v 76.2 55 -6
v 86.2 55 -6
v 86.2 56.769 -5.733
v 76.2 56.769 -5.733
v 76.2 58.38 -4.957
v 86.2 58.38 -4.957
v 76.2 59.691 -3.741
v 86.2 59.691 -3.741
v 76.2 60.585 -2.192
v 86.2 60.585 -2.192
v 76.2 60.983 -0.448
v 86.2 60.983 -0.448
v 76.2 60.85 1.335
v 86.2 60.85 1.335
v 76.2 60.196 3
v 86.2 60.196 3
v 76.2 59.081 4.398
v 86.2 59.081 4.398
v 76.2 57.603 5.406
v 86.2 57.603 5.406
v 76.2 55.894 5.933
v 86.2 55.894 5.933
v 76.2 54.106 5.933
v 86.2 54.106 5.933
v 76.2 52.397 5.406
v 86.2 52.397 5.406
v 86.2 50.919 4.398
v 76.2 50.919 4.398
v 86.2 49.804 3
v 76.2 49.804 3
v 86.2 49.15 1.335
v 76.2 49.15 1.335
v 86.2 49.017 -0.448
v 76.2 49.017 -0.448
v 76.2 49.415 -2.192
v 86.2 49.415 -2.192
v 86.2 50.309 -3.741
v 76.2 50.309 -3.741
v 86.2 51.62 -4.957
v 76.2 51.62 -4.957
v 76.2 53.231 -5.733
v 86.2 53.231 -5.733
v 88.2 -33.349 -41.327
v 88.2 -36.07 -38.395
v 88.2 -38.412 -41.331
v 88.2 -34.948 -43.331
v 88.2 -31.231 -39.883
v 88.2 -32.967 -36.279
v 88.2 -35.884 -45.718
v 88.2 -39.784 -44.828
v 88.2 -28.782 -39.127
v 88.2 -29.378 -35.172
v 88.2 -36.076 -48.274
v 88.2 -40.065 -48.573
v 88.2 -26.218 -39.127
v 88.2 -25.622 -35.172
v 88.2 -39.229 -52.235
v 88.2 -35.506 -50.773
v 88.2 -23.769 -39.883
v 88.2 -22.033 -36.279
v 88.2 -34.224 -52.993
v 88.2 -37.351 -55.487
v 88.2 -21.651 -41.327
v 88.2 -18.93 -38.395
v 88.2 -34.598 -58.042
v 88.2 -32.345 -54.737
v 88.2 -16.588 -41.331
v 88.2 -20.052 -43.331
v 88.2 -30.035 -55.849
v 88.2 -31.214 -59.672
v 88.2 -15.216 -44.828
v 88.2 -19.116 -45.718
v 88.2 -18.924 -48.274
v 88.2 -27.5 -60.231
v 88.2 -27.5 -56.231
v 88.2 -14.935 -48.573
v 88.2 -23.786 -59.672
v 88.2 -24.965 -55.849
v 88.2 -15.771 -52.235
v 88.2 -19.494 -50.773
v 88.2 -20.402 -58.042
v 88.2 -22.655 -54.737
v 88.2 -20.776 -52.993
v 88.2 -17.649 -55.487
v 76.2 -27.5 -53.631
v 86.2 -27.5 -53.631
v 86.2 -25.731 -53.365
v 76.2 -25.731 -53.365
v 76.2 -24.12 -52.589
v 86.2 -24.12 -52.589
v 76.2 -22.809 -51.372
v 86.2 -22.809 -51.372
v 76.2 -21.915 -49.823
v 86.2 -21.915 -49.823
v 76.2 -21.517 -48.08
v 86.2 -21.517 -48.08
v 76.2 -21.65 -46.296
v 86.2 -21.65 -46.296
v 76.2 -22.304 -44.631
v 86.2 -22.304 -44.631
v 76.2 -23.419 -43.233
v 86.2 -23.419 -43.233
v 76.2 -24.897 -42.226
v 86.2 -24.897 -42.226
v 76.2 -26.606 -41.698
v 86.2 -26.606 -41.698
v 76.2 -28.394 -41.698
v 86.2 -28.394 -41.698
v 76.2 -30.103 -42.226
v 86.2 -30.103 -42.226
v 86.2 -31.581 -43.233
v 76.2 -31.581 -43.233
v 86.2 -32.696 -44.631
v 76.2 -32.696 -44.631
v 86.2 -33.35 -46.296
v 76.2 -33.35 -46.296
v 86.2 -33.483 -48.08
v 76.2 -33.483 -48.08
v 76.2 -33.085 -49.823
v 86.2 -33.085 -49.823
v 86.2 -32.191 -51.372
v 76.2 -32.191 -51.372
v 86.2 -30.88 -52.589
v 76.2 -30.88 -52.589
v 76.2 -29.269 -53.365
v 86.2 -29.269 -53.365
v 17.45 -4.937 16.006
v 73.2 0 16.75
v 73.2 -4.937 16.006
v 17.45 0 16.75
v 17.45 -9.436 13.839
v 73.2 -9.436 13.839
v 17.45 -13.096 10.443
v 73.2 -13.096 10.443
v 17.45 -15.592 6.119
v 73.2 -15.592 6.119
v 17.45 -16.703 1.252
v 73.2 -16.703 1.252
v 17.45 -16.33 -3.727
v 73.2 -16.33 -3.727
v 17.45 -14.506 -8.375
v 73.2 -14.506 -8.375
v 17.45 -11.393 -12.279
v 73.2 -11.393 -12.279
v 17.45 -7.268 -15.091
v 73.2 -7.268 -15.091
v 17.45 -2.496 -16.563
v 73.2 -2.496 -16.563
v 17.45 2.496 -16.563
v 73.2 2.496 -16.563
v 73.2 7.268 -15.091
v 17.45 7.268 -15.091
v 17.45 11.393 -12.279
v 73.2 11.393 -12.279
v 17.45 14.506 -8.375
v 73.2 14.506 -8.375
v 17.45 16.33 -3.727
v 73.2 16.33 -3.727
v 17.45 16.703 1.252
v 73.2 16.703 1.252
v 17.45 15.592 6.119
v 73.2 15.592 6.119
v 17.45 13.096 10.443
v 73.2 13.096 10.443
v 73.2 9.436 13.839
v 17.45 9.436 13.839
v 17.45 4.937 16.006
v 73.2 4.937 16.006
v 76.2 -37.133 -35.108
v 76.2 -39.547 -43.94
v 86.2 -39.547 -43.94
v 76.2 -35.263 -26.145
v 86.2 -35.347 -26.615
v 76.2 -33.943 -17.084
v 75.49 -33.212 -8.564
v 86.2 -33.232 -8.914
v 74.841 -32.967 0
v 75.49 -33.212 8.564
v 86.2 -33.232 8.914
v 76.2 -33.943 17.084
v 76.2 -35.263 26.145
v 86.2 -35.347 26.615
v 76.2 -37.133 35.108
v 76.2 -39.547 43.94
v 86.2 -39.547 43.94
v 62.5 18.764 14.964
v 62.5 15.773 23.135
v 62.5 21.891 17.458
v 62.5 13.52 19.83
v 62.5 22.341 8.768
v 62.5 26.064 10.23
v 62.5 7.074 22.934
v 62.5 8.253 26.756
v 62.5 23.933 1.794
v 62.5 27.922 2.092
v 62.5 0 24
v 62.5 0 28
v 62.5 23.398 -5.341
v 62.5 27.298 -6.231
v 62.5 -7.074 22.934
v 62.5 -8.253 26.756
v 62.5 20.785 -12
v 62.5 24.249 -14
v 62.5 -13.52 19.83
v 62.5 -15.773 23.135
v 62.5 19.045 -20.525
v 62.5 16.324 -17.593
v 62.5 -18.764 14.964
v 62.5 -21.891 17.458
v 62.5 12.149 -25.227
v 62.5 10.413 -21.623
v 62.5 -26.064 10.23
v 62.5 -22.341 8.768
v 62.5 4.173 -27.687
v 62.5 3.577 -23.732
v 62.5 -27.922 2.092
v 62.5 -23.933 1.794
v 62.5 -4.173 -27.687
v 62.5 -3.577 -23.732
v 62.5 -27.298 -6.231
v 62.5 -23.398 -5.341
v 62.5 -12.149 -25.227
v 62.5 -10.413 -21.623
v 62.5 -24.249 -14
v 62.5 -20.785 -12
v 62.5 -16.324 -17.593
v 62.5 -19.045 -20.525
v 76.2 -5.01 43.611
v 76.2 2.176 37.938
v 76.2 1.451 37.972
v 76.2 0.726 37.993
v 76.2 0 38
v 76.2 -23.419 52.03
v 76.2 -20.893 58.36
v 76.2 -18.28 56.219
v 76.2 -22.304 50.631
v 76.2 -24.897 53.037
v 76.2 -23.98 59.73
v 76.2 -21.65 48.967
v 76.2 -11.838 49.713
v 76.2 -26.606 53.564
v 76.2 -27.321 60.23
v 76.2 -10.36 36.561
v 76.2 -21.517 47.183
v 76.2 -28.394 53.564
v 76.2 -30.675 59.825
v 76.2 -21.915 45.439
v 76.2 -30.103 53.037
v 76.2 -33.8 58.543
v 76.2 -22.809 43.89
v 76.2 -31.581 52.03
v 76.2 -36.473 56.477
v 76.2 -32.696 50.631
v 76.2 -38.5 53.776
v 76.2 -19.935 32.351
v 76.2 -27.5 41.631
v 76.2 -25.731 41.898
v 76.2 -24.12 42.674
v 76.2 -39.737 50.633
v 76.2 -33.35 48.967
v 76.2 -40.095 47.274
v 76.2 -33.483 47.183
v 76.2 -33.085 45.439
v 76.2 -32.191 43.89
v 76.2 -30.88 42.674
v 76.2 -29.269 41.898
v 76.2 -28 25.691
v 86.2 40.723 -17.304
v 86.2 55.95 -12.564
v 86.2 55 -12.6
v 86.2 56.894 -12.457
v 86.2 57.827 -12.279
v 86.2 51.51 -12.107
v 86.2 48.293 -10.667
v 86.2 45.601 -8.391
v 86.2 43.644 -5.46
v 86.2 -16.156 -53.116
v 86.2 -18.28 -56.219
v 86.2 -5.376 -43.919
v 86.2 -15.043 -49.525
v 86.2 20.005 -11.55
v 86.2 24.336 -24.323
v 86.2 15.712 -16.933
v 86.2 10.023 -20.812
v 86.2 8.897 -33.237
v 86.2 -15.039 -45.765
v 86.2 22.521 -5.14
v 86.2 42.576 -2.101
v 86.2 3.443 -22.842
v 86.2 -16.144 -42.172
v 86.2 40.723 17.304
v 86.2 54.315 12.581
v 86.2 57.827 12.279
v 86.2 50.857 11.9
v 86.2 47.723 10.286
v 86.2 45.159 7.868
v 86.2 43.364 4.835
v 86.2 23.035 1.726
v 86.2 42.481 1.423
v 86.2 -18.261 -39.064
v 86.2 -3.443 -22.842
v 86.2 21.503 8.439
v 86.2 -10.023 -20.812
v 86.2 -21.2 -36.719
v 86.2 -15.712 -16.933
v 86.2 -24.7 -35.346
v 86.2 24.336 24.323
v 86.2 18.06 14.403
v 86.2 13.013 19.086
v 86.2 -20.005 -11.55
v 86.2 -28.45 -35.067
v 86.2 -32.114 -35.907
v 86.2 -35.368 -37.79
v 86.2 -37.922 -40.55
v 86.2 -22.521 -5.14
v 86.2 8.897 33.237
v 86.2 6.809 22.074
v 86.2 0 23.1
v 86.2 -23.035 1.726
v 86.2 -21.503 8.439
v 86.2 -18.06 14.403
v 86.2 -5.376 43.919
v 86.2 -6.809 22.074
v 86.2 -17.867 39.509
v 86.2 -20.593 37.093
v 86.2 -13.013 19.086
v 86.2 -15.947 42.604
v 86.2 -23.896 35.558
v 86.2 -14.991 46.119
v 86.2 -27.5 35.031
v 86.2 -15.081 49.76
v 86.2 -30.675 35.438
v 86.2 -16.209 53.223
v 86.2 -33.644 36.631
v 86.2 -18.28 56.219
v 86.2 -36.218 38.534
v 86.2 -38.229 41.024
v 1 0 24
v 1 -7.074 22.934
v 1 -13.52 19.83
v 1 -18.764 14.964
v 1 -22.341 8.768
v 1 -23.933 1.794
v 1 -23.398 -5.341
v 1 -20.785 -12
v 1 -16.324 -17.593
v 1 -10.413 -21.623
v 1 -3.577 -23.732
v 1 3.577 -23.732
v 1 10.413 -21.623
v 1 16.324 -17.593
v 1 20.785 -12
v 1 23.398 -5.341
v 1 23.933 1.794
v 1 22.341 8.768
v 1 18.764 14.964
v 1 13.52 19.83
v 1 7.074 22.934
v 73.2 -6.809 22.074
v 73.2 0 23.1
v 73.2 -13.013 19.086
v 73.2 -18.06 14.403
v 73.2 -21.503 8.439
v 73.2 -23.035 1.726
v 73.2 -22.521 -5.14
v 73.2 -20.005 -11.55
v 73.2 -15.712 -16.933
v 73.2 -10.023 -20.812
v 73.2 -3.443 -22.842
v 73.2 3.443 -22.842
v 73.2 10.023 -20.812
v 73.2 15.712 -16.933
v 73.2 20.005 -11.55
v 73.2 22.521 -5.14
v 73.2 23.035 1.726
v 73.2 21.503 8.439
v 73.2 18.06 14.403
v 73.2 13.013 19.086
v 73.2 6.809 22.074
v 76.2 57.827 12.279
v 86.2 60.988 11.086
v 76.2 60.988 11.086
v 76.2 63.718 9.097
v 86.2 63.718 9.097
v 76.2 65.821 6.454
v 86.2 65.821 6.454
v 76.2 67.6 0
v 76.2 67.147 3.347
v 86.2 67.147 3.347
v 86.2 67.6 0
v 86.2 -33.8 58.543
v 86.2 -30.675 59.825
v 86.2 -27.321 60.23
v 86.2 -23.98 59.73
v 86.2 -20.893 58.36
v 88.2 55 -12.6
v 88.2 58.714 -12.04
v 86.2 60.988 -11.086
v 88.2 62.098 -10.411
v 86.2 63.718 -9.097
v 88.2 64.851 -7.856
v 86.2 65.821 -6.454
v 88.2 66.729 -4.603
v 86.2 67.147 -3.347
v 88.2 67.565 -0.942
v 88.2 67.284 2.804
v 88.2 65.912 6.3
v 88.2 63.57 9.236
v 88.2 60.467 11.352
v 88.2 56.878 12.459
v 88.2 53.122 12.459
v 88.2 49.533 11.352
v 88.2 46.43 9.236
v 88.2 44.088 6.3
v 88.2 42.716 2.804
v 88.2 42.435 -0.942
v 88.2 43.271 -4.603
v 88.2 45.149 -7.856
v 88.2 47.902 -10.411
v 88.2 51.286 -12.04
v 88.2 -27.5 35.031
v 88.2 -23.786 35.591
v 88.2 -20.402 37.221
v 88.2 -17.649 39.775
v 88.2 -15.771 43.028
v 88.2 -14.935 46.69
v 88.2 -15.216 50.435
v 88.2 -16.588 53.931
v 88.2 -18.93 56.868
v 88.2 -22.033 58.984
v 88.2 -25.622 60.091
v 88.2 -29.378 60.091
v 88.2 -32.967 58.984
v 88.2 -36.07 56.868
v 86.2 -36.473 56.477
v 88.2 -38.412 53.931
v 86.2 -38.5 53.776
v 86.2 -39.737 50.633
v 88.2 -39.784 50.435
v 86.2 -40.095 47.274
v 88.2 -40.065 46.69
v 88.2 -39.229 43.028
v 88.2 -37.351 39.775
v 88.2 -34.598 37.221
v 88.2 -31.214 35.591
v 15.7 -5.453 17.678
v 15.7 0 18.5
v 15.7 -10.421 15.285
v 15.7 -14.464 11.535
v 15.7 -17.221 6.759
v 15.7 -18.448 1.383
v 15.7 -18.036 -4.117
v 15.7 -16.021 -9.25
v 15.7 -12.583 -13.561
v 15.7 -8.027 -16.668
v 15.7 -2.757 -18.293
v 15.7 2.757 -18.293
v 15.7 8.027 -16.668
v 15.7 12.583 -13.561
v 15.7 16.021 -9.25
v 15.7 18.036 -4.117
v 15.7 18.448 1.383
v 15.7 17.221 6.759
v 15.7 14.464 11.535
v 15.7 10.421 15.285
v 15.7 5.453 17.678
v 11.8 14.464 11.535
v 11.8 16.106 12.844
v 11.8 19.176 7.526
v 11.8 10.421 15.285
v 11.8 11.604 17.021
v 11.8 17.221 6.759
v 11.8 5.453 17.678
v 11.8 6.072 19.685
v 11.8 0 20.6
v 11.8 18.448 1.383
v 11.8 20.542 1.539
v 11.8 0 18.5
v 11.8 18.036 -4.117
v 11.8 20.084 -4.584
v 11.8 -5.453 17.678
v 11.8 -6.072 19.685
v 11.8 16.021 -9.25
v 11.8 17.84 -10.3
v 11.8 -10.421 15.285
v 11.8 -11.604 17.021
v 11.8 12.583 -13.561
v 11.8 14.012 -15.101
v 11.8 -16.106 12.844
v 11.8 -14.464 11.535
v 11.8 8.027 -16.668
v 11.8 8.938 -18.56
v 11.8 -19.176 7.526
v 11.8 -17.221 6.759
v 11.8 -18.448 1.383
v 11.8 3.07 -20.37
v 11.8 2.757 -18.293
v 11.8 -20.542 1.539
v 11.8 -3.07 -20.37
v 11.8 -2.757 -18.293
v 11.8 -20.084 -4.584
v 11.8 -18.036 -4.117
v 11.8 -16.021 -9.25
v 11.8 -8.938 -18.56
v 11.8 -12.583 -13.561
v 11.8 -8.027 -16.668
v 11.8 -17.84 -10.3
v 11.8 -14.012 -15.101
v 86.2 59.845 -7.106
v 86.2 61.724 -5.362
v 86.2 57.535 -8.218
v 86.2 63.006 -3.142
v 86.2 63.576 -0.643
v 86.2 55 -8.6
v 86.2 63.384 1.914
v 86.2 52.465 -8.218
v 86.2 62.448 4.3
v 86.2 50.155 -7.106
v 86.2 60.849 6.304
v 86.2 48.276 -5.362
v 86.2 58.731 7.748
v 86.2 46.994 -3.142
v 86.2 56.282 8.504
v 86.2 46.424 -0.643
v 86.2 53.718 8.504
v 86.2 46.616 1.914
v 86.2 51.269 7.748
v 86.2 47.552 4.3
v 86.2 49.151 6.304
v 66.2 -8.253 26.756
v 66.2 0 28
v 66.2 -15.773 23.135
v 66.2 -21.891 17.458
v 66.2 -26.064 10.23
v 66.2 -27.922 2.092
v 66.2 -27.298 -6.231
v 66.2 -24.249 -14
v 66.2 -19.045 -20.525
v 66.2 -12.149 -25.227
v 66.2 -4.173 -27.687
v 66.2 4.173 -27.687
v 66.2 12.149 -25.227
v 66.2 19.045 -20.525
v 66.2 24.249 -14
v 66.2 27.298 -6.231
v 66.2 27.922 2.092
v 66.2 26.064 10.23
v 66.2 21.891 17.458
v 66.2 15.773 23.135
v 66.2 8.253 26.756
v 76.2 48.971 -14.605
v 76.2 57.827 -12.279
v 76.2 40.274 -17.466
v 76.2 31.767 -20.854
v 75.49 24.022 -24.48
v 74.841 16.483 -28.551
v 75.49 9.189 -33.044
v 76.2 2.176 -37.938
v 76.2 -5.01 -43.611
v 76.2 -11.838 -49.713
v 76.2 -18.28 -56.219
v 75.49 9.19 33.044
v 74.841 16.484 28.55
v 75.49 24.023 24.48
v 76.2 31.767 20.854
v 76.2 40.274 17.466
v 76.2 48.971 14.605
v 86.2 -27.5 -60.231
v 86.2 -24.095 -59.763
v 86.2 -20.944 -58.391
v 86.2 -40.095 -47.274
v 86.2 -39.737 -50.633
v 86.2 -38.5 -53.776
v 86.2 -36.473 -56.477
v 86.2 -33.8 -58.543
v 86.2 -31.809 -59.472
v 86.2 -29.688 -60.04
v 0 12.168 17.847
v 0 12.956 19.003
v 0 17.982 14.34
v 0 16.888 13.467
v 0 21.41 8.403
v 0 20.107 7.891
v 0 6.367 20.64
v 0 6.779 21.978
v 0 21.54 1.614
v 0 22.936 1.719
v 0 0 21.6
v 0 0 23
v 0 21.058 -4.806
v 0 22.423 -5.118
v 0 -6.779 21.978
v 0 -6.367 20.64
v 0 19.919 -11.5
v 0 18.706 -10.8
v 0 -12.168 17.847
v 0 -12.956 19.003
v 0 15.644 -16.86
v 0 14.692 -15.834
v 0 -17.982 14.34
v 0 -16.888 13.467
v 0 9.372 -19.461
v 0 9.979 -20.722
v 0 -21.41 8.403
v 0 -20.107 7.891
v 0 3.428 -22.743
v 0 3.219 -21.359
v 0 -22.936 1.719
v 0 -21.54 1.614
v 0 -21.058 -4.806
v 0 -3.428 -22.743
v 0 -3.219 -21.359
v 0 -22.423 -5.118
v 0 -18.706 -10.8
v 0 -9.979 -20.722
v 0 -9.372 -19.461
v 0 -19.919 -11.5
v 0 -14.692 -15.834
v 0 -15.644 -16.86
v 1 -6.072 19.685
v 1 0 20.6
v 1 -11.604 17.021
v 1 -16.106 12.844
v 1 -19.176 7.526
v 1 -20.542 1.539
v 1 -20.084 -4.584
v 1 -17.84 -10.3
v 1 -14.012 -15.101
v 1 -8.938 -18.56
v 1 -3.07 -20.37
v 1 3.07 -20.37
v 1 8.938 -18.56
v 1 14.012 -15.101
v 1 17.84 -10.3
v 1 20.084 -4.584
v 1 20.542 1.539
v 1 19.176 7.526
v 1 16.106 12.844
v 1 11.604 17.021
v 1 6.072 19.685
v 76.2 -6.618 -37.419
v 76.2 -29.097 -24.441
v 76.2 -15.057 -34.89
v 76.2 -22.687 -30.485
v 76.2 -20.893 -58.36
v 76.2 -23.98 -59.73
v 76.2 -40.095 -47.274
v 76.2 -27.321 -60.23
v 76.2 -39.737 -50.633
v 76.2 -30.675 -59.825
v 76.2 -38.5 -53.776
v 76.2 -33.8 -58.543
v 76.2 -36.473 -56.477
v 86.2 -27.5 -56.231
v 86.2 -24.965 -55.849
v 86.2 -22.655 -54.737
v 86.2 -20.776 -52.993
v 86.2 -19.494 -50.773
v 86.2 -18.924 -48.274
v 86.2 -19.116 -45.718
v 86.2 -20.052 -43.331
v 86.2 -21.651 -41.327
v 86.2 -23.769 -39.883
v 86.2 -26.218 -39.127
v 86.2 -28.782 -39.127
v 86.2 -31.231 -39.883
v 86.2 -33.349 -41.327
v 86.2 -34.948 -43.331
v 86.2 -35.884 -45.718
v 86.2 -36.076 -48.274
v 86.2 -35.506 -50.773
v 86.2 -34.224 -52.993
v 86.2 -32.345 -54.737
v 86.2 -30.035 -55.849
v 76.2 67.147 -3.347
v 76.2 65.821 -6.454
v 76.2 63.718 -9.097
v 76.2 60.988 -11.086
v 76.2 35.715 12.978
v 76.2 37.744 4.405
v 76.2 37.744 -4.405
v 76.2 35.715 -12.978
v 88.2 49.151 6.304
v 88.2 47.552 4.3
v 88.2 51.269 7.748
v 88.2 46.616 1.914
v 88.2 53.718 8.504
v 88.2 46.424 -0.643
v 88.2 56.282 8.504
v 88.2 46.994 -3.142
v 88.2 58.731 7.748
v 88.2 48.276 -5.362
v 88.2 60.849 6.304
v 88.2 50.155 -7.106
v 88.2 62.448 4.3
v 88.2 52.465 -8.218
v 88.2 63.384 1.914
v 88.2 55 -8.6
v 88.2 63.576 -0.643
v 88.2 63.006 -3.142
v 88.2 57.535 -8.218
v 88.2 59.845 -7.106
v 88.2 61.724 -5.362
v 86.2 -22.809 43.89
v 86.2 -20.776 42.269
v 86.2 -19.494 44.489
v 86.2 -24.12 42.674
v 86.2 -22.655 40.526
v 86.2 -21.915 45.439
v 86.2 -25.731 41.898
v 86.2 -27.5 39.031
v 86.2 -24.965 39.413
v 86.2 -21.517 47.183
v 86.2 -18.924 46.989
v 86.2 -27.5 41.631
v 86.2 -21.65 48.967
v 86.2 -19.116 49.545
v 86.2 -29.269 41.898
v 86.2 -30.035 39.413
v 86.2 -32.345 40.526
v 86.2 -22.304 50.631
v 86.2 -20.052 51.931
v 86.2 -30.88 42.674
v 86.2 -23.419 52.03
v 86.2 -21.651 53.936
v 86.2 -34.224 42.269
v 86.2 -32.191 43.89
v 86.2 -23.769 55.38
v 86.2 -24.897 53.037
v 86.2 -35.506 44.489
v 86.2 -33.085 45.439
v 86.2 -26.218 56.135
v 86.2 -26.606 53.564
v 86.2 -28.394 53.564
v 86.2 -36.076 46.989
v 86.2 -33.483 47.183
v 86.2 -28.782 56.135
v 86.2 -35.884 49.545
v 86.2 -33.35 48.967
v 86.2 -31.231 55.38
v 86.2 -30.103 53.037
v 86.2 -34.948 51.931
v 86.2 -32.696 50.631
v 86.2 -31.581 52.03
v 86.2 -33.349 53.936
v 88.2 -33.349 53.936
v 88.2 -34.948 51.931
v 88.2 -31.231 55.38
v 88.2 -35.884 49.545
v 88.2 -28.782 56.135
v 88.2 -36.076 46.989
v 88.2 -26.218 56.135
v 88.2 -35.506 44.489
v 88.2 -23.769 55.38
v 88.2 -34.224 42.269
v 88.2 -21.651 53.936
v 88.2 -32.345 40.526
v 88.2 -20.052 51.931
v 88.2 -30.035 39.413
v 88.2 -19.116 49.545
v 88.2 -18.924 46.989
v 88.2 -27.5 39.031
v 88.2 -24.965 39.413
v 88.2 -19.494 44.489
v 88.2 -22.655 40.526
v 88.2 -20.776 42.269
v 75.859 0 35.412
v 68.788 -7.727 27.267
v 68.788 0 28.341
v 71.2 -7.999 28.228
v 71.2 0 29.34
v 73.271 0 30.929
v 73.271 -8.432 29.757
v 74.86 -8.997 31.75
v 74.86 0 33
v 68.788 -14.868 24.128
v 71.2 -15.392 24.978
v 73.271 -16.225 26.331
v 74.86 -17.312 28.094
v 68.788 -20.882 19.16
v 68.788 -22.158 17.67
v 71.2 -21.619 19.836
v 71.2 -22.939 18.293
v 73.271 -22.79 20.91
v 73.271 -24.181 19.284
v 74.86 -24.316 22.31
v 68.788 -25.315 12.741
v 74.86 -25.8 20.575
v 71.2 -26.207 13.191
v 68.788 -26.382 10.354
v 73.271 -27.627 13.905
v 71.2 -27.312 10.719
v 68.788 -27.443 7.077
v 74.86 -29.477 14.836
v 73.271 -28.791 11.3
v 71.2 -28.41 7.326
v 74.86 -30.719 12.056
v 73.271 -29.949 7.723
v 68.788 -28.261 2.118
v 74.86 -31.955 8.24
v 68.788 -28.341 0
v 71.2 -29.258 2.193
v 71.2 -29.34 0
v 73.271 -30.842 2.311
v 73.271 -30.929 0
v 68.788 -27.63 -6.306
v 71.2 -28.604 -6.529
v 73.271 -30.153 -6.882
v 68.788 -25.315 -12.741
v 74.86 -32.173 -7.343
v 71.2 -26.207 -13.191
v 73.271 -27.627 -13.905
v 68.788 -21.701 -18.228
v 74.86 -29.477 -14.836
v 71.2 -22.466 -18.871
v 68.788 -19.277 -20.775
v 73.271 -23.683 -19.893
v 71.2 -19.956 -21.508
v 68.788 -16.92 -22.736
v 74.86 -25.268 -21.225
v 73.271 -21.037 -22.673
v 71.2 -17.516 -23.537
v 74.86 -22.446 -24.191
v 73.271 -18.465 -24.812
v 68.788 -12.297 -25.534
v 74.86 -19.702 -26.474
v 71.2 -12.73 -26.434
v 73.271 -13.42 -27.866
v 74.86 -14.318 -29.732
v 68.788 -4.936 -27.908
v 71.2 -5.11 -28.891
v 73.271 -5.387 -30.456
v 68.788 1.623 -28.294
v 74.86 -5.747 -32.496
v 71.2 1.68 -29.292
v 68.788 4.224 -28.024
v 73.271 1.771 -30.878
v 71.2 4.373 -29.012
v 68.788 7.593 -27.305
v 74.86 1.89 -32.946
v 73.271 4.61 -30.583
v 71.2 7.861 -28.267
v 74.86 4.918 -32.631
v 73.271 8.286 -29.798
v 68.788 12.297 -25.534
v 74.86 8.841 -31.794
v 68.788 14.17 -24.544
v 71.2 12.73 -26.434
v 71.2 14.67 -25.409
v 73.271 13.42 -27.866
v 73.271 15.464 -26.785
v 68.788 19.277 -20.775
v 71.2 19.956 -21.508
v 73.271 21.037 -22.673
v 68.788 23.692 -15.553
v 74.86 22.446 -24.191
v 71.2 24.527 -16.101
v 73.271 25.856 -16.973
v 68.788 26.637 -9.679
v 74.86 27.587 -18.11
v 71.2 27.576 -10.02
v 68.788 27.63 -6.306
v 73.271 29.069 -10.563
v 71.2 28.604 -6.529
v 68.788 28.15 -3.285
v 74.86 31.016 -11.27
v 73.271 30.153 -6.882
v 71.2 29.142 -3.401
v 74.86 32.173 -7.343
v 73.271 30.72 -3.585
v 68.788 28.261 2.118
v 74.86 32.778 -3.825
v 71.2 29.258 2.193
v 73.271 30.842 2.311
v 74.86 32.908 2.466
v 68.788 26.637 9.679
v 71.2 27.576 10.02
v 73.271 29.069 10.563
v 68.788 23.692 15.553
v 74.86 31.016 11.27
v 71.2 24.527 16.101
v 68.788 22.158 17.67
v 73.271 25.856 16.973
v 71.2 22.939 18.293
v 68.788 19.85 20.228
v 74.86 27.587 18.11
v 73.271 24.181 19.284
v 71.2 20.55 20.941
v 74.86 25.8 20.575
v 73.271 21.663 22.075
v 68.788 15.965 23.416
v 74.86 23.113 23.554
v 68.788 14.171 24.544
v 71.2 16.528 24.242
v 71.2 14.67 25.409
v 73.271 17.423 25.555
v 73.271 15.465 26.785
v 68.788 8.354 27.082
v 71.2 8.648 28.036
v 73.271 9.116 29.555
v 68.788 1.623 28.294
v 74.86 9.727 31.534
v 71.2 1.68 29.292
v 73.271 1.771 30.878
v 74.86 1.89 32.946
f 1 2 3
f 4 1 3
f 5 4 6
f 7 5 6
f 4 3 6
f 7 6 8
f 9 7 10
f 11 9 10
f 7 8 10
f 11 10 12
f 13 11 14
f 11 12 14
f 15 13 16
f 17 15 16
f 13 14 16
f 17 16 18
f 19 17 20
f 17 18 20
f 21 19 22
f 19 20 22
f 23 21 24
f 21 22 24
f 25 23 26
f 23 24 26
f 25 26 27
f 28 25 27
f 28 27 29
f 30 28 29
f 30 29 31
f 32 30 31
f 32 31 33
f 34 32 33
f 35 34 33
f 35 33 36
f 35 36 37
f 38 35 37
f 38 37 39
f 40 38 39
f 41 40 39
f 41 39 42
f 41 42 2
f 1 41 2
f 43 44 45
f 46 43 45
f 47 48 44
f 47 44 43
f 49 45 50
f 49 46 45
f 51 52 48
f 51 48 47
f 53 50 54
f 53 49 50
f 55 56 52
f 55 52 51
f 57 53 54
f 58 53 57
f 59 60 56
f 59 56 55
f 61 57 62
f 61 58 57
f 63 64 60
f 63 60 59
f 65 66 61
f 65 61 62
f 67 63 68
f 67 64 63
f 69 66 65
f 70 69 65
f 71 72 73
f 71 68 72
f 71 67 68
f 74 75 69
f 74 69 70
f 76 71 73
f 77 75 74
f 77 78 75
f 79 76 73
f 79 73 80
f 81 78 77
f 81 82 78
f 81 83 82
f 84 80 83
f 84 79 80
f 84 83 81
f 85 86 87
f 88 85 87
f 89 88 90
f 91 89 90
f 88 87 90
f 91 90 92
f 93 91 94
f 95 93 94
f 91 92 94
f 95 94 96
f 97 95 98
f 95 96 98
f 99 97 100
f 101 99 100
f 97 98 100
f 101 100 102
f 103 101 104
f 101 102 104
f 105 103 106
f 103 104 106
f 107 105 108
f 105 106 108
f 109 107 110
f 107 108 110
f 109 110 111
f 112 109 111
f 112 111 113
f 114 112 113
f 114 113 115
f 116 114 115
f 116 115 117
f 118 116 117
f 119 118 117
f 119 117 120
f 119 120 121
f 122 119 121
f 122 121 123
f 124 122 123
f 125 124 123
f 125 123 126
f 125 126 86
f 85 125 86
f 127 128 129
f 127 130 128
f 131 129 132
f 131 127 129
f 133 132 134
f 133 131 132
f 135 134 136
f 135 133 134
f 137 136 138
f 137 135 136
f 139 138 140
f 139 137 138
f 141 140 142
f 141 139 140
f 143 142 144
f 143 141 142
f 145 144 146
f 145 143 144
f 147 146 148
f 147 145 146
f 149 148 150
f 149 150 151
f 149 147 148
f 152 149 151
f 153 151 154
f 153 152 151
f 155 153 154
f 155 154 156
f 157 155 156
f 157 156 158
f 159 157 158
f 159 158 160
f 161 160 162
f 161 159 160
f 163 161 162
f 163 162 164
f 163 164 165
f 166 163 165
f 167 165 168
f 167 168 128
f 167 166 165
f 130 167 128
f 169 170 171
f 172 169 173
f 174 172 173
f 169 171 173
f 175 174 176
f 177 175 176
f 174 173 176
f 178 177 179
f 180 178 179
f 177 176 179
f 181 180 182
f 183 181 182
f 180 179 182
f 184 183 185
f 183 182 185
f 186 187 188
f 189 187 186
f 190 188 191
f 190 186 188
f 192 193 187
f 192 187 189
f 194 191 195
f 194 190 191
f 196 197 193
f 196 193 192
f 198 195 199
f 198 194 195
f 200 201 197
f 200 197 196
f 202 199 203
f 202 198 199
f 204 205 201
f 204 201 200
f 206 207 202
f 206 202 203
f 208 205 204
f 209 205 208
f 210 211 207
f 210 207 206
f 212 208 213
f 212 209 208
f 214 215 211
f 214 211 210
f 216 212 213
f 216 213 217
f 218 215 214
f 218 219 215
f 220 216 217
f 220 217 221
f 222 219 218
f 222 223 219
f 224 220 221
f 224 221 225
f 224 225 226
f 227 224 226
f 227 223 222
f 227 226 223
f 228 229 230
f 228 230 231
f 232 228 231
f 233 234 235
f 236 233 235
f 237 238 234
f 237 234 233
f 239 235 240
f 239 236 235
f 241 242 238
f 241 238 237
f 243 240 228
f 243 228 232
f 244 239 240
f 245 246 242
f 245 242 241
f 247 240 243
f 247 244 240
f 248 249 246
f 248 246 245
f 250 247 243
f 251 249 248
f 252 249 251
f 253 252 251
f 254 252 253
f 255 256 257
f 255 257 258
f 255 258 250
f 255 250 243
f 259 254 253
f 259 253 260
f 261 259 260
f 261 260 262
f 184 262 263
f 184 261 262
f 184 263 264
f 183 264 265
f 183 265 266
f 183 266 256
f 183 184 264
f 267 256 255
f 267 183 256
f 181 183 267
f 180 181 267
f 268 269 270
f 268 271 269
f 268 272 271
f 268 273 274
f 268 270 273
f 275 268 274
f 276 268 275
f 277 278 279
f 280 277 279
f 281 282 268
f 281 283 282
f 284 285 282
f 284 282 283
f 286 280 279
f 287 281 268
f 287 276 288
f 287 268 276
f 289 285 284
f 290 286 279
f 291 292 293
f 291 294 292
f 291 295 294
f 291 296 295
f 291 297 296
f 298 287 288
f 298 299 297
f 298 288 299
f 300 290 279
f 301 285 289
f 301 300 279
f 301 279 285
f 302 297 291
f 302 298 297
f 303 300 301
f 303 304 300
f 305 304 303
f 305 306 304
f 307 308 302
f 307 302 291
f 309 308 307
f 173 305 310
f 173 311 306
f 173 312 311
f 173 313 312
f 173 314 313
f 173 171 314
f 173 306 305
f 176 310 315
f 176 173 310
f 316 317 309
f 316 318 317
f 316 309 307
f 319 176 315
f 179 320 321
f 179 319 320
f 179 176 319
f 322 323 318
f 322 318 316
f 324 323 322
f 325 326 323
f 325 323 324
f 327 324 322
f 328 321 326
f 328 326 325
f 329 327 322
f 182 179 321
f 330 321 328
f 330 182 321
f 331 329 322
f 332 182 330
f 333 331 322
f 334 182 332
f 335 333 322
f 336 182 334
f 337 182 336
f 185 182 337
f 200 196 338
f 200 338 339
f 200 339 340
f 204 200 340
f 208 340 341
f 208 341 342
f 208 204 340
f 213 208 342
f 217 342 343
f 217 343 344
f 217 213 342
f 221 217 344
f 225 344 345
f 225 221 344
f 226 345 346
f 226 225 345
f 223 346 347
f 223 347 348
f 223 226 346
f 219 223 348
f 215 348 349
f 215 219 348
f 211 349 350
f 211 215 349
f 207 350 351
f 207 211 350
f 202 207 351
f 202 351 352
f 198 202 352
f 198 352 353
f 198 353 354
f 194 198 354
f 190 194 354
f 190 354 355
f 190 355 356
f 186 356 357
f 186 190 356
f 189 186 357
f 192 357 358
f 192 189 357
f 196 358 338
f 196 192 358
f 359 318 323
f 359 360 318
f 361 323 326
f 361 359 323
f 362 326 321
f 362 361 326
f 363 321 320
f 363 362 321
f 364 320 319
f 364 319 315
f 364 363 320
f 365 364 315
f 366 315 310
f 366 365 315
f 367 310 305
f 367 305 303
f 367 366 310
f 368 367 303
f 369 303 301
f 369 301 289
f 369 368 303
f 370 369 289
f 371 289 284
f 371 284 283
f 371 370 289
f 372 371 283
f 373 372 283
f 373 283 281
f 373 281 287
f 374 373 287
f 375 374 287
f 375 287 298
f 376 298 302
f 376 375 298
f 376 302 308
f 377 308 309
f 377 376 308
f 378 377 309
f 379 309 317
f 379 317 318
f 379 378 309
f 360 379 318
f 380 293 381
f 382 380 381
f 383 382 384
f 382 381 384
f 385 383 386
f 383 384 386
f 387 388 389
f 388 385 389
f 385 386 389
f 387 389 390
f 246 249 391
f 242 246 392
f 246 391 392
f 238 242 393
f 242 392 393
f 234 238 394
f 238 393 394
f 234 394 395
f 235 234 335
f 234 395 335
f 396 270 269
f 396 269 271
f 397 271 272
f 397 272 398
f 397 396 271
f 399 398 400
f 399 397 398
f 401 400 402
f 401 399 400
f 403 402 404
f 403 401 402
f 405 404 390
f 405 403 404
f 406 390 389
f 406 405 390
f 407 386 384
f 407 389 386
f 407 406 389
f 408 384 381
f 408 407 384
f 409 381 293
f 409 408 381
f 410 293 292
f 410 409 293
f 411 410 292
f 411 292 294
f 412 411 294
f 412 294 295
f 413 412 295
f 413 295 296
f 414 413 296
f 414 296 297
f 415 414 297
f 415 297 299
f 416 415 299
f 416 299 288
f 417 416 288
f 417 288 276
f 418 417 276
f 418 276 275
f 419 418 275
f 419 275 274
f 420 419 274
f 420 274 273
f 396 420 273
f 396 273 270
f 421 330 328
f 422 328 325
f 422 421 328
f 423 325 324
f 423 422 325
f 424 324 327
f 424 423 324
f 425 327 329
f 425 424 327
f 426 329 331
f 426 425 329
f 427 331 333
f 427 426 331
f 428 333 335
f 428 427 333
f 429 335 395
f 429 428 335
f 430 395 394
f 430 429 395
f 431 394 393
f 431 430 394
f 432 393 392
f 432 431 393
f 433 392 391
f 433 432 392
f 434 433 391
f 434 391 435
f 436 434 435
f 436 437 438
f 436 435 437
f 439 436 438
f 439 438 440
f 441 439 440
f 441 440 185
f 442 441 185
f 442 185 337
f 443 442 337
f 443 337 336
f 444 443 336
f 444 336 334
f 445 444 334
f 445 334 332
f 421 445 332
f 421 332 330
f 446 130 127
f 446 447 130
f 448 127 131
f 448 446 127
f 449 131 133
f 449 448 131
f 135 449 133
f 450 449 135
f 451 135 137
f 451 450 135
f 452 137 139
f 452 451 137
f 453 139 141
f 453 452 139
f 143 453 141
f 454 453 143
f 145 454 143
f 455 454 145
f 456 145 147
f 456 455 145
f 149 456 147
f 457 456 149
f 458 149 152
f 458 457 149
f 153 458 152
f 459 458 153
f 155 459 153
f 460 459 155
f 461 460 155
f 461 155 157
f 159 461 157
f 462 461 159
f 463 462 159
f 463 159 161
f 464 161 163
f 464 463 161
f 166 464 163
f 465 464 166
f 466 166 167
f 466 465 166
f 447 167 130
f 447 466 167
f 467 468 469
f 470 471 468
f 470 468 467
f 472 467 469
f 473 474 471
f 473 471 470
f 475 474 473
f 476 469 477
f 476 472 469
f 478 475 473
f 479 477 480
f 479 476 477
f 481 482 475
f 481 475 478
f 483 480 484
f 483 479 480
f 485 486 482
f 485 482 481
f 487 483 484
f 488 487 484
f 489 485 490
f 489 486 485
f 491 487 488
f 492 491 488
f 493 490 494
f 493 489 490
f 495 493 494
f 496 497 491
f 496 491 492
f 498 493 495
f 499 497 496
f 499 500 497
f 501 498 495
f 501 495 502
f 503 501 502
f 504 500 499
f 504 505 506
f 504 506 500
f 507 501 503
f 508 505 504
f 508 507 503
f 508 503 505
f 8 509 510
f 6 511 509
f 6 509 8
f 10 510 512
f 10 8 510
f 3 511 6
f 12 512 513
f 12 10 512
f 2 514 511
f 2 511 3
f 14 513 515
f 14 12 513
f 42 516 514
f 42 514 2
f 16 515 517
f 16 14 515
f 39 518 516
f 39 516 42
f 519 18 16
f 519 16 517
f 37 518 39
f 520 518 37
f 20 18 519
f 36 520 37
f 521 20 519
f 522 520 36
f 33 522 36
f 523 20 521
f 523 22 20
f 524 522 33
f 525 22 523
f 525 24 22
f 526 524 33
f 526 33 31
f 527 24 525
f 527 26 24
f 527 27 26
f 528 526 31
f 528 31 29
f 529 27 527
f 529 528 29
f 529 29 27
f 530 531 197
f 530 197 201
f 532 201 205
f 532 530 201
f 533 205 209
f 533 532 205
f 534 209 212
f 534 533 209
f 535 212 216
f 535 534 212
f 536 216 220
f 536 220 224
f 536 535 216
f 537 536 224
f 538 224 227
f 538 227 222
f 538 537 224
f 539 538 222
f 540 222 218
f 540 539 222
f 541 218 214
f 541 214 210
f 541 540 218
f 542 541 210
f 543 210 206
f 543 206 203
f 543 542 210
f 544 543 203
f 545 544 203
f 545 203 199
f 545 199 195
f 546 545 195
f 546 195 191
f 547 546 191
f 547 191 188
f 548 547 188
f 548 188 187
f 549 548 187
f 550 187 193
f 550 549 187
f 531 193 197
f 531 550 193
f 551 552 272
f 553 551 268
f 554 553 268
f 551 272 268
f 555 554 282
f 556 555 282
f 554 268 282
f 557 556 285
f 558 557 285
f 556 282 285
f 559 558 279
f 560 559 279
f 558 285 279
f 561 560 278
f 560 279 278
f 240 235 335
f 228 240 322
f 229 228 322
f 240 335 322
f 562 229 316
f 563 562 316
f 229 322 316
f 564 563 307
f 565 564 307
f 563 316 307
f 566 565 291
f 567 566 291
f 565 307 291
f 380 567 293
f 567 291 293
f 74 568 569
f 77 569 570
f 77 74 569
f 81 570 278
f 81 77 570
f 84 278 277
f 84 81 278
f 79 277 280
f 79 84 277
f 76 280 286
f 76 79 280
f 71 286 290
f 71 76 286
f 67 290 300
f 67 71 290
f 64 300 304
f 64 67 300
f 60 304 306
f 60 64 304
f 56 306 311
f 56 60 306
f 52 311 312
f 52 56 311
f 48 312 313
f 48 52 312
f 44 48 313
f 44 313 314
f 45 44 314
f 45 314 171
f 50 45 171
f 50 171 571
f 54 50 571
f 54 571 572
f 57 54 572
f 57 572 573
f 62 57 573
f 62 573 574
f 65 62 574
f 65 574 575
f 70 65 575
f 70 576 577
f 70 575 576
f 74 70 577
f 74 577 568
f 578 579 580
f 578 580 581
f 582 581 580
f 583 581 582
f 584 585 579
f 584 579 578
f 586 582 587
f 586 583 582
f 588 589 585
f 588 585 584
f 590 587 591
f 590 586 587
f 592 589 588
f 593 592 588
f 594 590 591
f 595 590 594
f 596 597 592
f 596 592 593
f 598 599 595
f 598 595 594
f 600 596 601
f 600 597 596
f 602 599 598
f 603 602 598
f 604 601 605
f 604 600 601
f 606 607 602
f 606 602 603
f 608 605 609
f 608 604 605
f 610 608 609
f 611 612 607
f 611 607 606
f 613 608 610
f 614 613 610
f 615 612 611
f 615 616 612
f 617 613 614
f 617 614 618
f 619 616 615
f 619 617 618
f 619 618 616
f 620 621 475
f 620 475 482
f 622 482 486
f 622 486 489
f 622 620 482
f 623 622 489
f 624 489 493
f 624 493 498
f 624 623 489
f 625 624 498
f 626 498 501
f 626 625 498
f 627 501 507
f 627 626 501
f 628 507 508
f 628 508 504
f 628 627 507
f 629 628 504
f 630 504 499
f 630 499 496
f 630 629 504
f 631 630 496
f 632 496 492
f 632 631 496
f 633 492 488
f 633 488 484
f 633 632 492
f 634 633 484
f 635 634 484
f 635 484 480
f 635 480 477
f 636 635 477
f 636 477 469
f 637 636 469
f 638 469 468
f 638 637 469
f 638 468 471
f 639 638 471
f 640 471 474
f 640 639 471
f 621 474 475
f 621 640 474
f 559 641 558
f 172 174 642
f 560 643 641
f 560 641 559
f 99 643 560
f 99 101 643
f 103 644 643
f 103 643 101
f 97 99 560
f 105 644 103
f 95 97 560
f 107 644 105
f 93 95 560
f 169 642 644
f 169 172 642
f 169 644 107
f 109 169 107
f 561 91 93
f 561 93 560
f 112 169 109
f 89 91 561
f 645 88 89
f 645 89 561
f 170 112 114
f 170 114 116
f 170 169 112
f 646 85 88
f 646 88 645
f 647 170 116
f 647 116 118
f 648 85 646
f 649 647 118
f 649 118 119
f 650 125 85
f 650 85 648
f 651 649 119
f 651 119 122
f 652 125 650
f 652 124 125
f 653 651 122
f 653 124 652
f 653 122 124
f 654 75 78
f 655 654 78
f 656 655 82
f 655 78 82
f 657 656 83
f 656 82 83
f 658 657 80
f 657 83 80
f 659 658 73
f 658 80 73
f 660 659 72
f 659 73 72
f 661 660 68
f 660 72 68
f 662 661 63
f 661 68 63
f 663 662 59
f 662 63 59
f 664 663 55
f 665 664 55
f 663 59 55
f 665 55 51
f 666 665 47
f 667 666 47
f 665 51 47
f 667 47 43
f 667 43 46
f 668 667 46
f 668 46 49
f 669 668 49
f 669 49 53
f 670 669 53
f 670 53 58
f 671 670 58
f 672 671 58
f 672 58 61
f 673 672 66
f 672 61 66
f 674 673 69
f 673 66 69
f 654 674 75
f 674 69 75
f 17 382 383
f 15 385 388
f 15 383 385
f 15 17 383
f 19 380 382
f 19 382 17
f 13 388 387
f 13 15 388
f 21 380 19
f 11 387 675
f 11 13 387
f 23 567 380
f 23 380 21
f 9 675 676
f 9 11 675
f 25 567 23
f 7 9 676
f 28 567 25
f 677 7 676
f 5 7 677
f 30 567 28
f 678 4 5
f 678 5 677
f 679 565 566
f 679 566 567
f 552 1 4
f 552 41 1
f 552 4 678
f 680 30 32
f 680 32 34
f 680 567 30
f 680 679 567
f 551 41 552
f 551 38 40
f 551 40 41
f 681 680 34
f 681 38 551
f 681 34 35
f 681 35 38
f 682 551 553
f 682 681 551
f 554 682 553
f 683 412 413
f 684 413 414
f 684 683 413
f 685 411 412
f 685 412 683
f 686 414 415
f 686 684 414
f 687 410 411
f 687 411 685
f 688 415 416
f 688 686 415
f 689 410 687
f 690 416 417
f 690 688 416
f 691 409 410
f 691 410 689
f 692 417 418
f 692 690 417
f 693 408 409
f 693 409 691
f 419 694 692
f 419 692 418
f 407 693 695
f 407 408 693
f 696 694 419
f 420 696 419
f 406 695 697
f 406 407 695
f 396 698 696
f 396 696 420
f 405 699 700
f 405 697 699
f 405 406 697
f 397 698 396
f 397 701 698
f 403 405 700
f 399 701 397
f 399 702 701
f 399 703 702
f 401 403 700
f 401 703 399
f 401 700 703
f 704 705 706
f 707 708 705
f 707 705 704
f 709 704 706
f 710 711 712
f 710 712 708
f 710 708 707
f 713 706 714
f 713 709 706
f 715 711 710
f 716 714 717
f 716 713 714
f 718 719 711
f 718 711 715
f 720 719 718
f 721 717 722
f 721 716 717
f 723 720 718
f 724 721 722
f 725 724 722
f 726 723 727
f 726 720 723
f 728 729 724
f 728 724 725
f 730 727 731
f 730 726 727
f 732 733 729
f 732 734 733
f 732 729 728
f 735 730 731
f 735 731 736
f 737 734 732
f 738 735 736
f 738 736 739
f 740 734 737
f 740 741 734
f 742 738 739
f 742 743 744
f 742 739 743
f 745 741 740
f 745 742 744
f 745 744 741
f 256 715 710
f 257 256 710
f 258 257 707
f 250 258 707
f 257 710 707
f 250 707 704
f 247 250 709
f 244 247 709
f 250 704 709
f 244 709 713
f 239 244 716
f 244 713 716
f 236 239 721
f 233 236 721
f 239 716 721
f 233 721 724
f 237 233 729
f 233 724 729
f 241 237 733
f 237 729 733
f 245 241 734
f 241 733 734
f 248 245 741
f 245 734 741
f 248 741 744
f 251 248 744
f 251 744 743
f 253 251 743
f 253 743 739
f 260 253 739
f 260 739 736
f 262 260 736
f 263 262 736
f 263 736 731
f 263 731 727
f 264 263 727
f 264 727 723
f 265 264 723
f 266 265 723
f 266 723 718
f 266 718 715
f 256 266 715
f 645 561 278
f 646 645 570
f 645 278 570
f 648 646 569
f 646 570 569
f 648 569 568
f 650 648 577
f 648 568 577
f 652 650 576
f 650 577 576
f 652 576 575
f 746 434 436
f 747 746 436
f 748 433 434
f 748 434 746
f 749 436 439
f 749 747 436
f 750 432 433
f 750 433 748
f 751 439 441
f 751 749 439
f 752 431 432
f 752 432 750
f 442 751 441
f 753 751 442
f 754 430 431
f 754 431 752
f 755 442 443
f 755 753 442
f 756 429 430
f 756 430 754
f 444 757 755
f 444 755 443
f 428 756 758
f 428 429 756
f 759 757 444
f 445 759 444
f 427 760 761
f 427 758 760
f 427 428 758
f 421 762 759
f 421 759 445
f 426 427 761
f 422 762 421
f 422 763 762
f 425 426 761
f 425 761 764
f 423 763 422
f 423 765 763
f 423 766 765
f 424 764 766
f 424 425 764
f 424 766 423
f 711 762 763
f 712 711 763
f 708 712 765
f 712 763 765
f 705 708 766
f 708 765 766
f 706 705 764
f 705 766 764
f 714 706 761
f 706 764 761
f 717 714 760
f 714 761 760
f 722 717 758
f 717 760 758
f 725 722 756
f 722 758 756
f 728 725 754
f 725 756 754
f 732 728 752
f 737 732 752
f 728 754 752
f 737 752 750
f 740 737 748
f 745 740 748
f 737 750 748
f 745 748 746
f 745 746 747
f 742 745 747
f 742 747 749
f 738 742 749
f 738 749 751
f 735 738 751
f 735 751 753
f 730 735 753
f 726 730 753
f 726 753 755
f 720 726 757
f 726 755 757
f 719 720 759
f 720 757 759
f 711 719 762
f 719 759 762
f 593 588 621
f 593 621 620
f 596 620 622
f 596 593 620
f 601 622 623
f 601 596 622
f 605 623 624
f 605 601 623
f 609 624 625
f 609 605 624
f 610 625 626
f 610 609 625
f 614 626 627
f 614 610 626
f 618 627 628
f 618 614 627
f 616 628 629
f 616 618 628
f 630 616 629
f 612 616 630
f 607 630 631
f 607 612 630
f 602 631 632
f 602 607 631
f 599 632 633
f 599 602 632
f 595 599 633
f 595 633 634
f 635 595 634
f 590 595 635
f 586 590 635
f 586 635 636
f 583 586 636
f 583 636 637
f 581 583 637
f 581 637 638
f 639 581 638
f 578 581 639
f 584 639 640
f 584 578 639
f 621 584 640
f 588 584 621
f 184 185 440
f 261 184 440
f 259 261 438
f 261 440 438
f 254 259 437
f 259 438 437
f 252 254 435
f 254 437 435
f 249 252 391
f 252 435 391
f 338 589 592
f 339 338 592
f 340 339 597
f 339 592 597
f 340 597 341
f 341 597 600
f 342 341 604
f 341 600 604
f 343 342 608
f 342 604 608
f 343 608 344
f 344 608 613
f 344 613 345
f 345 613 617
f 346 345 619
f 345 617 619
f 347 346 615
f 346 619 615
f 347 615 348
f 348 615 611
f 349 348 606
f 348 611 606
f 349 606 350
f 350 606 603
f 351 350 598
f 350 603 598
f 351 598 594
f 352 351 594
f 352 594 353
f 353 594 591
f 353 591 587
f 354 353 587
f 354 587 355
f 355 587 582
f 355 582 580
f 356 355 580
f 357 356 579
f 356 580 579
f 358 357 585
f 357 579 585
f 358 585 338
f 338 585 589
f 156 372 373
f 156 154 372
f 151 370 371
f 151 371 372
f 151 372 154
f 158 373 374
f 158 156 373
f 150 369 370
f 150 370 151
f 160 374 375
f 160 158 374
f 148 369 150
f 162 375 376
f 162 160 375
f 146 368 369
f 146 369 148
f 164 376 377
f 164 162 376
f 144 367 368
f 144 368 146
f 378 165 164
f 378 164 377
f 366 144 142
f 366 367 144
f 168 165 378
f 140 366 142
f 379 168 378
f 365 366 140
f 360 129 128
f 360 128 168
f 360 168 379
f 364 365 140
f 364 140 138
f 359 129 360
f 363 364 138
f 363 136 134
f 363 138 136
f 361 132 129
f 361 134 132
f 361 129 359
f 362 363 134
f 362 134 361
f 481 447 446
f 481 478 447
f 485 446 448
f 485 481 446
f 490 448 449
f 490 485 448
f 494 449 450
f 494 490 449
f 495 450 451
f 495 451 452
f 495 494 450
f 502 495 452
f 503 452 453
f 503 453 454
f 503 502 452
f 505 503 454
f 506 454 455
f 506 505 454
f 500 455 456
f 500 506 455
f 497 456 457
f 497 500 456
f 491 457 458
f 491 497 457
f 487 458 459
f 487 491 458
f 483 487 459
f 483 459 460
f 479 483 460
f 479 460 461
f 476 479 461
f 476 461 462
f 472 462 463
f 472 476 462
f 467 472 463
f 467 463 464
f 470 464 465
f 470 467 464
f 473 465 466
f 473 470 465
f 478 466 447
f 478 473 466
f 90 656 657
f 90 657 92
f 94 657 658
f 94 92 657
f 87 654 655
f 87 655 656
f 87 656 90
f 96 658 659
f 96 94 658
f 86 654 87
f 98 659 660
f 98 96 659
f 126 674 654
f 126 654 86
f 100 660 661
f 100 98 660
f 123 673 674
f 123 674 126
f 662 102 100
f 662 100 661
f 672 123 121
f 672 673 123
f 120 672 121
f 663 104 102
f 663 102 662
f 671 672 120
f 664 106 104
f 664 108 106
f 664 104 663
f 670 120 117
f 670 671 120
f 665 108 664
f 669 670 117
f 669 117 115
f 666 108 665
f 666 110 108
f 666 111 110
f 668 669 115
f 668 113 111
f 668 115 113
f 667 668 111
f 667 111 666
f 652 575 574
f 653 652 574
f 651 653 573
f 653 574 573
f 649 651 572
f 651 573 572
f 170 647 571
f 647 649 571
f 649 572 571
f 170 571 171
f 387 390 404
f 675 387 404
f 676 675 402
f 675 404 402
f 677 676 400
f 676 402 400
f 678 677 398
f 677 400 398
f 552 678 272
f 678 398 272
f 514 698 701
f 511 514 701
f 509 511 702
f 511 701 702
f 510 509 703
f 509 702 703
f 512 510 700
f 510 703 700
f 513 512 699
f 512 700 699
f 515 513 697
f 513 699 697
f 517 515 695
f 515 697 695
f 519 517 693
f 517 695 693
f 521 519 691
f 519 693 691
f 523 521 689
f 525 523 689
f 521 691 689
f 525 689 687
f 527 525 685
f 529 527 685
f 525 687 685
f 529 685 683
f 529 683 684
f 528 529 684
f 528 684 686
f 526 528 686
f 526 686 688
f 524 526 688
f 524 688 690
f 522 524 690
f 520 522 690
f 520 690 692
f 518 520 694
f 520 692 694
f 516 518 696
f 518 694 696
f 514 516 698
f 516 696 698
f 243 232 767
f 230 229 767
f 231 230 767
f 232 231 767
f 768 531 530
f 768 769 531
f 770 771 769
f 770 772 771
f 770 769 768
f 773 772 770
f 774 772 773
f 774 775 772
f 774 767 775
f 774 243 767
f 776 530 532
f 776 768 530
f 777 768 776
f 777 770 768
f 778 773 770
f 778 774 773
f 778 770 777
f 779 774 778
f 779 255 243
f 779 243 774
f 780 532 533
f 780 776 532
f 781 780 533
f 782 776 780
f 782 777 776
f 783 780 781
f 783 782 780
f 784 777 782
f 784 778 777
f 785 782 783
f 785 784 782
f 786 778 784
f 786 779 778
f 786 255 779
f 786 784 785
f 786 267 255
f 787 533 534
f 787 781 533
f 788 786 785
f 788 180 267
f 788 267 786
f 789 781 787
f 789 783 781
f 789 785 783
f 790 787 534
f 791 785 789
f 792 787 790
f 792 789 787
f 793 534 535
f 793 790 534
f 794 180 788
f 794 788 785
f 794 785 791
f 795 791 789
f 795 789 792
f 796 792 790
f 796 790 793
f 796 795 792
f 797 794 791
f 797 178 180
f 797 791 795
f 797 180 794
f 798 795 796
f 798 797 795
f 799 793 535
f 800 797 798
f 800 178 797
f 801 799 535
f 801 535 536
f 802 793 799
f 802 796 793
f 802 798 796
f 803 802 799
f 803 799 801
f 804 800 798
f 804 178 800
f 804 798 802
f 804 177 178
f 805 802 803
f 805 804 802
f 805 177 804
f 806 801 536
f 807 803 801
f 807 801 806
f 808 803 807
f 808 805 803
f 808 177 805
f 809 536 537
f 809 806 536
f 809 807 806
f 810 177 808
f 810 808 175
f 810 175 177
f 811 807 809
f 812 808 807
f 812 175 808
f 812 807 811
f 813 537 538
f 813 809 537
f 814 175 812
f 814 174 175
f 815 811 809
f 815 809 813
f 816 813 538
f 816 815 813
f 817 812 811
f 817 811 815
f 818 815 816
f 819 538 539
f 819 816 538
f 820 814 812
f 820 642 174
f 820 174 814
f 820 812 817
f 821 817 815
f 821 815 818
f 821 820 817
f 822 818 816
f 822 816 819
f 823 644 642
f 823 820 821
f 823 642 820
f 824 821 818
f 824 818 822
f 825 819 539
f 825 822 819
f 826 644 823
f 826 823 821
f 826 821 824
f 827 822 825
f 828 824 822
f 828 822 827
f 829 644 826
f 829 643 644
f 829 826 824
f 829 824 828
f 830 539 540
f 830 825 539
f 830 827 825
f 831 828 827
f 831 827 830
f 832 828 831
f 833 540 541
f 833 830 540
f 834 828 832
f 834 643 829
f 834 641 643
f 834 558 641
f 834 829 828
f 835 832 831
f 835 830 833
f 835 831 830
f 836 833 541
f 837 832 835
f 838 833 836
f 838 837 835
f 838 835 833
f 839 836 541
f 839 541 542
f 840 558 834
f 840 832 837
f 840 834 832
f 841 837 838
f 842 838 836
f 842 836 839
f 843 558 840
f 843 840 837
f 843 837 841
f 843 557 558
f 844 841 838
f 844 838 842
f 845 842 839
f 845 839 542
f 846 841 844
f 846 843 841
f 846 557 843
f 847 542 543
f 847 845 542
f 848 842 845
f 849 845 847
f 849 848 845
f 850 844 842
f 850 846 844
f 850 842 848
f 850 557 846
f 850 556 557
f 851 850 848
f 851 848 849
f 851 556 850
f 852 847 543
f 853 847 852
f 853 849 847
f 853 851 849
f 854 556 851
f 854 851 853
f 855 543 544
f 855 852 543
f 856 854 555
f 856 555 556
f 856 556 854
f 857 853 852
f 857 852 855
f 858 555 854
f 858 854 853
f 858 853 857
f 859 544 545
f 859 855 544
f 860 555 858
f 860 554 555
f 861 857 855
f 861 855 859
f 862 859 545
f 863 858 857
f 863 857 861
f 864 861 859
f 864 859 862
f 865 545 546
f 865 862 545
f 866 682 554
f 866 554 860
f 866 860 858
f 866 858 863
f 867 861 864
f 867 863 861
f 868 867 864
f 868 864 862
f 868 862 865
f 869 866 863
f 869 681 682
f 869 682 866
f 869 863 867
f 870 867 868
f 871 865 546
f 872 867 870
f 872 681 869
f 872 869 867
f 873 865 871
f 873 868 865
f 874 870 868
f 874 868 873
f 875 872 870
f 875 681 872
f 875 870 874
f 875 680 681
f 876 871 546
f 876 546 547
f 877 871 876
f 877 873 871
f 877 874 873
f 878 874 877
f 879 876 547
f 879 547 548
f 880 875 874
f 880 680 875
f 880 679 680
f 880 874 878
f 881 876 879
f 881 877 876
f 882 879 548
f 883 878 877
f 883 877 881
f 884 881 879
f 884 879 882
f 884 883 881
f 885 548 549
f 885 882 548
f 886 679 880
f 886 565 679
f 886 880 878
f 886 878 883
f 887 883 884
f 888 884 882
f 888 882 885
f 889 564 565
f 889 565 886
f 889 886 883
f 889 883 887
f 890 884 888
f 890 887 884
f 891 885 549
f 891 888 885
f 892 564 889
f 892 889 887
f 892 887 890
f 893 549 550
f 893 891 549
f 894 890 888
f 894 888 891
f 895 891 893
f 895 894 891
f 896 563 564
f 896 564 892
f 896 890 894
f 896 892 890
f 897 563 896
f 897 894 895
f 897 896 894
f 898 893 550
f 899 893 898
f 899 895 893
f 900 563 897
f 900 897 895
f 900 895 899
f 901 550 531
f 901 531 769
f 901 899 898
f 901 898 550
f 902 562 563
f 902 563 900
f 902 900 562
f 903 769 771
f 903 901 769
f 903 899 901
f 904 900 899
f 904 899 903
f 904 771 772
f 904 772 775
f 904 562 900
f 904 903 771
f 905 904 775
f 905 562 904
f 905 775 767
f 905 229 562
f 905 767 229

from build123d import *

# Parameters (mm, degrees)
CHAMFER1_SIZE       = 1
FILLET1_R           = 10
SKETCH2_R           = 6
CUT_EXTRUDE1_DEPTH  = 30
BOSS_EXTRUDE1_START = 2
SKETCH3_R           = 12.6
SKETCH3_R_2         = 8.6
BOSS_EXTRUDE1_DEPTH = 2


with BuildPart() as part:
    # Sketch1 → Revolve1 (revolve)
    with BuildSketch(Plane.XY, mode=Mode.PRIVATE) as revolve1_sk:
        Polygon((0, 24), (62.5, 24), (62.5, 28), (76.2, 28), (76.2, 67.6), (86.2, 67.6), (86.2, 23.1), (73.2, 23.1), (73.2, 16.75), (17.45, 16.75), (15.7, 18.5), (11.8, 18.5), (11.8, 20.6), (0, 20.6), align=None)
    revolve(revolve1_sk.sketch.rotate(Axis((0, 0, 0), (1, 0, 0)), 90), axis=Axis((0, 0, 0), (1, 0, 0)))

    # Chamfer1
    chamfer1_edges = [part.edges().sort_by_distance(p)[0] for p in [
        (0, 0, -24),
        (0, 0, -20.6),
    ]]
    chamfer(chamfer1_edges, length=CHAMFER1_SIZE)

    # Fillet1
    fillet1_edges = [part.edges().sort_by_distance(p)[0] for p in [
        (76.2, 0, -28),
    ]]
    fillet(fillet1_edges, radius=FILLET1_R)

    # Sketch2 → Cut-Extrude1 (cut)
    with BuildSketch(Plane(origin=(86.2, 0, 0), x_dir=(0, 0, -1), z_dir=(1, 0, 0))):
        with BuildLine():
            ThreePointArc((-58.543317297, -33.799999998), (-60.092446992, -25.63392436), (-56.219136733, -18.279873653))
            ThreePointArc((-56.219136733, -18.279873653), (-28.550320514, 16.483535234), (-12.278733405, 57.827137417))
            ThreePointArc((-12.278733405, 57.827137417), (-7.846593801, 64.858547851), (0, 67.6))
            ThreePointArc((0, 67.6), (-58.543317295, 33.800000001), (-58.543317297, -33.799999998))
        make_face()
        with BuildLine():
            ThreePointArc((67.6, 0), (47.800418408, 47.800418408), (0, 67.6))
            ThreePointArc((0, 67.6), (7.846593801, 64.858547851), (12.278733405, 57.827137417))
            ThreePointArc((12.278733405, 57.827137417), (28.550320514, 16.483535234), (56.219136733, -18.279873653))
            ThreePointArc((56.219136733, -18.279873653), (60.092446945, -25.633924049), (58.543317611, -33.799999453))
            ThreePointArc((58.543317611, -33.799999453), (65.296585939, -17.496167144), (67.6, 0))
        make_face()
        with BuildLine():
            ThreePointArc((-43.940403329, -39.547263763), (-52.245853192, -39.22462349), (-58.543317297, -33.799999998))
            ThreePointArc((-58.543317297, -33.799999998), (3.14e-07, -67.6), (58.543317611, -33.799999453))
            ThreePointArc((58.543317611, -33.799999453), (52.245853485, -39.224623374), (43.940403329, -39.547263763))
            ThreePointArc((43.940403329, -39.547263763), (0, -32.967070468), (-43.940403329, -39.547263763))
        make_face()
        with Locations((47.631397208, -27.5)):
            Circle(SKETCH2_R)
        with Locations((-47.631397208, -27.5)):
            Circle(SKETCH2_R)
        with Locations((0, 55)):
            Circle(SKETCH2_R)
    extrude(amount=-CUT_EXTRUDE1_DEPTH, mode=Mode.SUBTRACT)

    # Sketch3 → Boss-Extrude1 (add)
    # profile 1 of 3: a face of its own
    with BuildSketch(Plane(origin=(86.2, 0, 0), x_dir=(0, 0, -1), z_dir=(1, 0, 0)).offset(BOSS_EXTRUDE1_START)):
        with Locations((0, 55)):
            Circle(SKETCH3_R)
        with Locations((0, 55)):
            Circle(SKETCH3_R_2, mode=Mode.SUBTRACT)
    # profile 2 of 3: a face of its own
    with BuildSketch(Plane(origin=(86.2, 0, 0), x_dir=(0, 0, -1), z_dir=(1, 0, 0)).offset(BOSS_EXTRUDE1_START)):
        with Locations((47.631397208, -27.5)):
            Circle(SKETCH3_R)
        with Locations((47.631397208, -27.5)):
            Circle(SKETCH3_R_2, mode=Mode.SUBTRACT)
    # profile 3 of 3: a face of its own
    with BuildSketch(Plane(origin=(86.2, 0, 0), x_dir=(0, 0, -1), z_dir=(1, 0, 0)).offset(BOSS_EXTRUDE1_START)):
        with Locations((-47.631397208, -27.5)):
            Circle(SKETCH3_R)
        with Locations((-47.631397208, -27.5)):
            Circle(SKETCH3_R_2, mode=Mode.SUBTRACT)
    extrude(amount=-BOSS_EXTRUDE1_DEPTH)


solid = part.part
